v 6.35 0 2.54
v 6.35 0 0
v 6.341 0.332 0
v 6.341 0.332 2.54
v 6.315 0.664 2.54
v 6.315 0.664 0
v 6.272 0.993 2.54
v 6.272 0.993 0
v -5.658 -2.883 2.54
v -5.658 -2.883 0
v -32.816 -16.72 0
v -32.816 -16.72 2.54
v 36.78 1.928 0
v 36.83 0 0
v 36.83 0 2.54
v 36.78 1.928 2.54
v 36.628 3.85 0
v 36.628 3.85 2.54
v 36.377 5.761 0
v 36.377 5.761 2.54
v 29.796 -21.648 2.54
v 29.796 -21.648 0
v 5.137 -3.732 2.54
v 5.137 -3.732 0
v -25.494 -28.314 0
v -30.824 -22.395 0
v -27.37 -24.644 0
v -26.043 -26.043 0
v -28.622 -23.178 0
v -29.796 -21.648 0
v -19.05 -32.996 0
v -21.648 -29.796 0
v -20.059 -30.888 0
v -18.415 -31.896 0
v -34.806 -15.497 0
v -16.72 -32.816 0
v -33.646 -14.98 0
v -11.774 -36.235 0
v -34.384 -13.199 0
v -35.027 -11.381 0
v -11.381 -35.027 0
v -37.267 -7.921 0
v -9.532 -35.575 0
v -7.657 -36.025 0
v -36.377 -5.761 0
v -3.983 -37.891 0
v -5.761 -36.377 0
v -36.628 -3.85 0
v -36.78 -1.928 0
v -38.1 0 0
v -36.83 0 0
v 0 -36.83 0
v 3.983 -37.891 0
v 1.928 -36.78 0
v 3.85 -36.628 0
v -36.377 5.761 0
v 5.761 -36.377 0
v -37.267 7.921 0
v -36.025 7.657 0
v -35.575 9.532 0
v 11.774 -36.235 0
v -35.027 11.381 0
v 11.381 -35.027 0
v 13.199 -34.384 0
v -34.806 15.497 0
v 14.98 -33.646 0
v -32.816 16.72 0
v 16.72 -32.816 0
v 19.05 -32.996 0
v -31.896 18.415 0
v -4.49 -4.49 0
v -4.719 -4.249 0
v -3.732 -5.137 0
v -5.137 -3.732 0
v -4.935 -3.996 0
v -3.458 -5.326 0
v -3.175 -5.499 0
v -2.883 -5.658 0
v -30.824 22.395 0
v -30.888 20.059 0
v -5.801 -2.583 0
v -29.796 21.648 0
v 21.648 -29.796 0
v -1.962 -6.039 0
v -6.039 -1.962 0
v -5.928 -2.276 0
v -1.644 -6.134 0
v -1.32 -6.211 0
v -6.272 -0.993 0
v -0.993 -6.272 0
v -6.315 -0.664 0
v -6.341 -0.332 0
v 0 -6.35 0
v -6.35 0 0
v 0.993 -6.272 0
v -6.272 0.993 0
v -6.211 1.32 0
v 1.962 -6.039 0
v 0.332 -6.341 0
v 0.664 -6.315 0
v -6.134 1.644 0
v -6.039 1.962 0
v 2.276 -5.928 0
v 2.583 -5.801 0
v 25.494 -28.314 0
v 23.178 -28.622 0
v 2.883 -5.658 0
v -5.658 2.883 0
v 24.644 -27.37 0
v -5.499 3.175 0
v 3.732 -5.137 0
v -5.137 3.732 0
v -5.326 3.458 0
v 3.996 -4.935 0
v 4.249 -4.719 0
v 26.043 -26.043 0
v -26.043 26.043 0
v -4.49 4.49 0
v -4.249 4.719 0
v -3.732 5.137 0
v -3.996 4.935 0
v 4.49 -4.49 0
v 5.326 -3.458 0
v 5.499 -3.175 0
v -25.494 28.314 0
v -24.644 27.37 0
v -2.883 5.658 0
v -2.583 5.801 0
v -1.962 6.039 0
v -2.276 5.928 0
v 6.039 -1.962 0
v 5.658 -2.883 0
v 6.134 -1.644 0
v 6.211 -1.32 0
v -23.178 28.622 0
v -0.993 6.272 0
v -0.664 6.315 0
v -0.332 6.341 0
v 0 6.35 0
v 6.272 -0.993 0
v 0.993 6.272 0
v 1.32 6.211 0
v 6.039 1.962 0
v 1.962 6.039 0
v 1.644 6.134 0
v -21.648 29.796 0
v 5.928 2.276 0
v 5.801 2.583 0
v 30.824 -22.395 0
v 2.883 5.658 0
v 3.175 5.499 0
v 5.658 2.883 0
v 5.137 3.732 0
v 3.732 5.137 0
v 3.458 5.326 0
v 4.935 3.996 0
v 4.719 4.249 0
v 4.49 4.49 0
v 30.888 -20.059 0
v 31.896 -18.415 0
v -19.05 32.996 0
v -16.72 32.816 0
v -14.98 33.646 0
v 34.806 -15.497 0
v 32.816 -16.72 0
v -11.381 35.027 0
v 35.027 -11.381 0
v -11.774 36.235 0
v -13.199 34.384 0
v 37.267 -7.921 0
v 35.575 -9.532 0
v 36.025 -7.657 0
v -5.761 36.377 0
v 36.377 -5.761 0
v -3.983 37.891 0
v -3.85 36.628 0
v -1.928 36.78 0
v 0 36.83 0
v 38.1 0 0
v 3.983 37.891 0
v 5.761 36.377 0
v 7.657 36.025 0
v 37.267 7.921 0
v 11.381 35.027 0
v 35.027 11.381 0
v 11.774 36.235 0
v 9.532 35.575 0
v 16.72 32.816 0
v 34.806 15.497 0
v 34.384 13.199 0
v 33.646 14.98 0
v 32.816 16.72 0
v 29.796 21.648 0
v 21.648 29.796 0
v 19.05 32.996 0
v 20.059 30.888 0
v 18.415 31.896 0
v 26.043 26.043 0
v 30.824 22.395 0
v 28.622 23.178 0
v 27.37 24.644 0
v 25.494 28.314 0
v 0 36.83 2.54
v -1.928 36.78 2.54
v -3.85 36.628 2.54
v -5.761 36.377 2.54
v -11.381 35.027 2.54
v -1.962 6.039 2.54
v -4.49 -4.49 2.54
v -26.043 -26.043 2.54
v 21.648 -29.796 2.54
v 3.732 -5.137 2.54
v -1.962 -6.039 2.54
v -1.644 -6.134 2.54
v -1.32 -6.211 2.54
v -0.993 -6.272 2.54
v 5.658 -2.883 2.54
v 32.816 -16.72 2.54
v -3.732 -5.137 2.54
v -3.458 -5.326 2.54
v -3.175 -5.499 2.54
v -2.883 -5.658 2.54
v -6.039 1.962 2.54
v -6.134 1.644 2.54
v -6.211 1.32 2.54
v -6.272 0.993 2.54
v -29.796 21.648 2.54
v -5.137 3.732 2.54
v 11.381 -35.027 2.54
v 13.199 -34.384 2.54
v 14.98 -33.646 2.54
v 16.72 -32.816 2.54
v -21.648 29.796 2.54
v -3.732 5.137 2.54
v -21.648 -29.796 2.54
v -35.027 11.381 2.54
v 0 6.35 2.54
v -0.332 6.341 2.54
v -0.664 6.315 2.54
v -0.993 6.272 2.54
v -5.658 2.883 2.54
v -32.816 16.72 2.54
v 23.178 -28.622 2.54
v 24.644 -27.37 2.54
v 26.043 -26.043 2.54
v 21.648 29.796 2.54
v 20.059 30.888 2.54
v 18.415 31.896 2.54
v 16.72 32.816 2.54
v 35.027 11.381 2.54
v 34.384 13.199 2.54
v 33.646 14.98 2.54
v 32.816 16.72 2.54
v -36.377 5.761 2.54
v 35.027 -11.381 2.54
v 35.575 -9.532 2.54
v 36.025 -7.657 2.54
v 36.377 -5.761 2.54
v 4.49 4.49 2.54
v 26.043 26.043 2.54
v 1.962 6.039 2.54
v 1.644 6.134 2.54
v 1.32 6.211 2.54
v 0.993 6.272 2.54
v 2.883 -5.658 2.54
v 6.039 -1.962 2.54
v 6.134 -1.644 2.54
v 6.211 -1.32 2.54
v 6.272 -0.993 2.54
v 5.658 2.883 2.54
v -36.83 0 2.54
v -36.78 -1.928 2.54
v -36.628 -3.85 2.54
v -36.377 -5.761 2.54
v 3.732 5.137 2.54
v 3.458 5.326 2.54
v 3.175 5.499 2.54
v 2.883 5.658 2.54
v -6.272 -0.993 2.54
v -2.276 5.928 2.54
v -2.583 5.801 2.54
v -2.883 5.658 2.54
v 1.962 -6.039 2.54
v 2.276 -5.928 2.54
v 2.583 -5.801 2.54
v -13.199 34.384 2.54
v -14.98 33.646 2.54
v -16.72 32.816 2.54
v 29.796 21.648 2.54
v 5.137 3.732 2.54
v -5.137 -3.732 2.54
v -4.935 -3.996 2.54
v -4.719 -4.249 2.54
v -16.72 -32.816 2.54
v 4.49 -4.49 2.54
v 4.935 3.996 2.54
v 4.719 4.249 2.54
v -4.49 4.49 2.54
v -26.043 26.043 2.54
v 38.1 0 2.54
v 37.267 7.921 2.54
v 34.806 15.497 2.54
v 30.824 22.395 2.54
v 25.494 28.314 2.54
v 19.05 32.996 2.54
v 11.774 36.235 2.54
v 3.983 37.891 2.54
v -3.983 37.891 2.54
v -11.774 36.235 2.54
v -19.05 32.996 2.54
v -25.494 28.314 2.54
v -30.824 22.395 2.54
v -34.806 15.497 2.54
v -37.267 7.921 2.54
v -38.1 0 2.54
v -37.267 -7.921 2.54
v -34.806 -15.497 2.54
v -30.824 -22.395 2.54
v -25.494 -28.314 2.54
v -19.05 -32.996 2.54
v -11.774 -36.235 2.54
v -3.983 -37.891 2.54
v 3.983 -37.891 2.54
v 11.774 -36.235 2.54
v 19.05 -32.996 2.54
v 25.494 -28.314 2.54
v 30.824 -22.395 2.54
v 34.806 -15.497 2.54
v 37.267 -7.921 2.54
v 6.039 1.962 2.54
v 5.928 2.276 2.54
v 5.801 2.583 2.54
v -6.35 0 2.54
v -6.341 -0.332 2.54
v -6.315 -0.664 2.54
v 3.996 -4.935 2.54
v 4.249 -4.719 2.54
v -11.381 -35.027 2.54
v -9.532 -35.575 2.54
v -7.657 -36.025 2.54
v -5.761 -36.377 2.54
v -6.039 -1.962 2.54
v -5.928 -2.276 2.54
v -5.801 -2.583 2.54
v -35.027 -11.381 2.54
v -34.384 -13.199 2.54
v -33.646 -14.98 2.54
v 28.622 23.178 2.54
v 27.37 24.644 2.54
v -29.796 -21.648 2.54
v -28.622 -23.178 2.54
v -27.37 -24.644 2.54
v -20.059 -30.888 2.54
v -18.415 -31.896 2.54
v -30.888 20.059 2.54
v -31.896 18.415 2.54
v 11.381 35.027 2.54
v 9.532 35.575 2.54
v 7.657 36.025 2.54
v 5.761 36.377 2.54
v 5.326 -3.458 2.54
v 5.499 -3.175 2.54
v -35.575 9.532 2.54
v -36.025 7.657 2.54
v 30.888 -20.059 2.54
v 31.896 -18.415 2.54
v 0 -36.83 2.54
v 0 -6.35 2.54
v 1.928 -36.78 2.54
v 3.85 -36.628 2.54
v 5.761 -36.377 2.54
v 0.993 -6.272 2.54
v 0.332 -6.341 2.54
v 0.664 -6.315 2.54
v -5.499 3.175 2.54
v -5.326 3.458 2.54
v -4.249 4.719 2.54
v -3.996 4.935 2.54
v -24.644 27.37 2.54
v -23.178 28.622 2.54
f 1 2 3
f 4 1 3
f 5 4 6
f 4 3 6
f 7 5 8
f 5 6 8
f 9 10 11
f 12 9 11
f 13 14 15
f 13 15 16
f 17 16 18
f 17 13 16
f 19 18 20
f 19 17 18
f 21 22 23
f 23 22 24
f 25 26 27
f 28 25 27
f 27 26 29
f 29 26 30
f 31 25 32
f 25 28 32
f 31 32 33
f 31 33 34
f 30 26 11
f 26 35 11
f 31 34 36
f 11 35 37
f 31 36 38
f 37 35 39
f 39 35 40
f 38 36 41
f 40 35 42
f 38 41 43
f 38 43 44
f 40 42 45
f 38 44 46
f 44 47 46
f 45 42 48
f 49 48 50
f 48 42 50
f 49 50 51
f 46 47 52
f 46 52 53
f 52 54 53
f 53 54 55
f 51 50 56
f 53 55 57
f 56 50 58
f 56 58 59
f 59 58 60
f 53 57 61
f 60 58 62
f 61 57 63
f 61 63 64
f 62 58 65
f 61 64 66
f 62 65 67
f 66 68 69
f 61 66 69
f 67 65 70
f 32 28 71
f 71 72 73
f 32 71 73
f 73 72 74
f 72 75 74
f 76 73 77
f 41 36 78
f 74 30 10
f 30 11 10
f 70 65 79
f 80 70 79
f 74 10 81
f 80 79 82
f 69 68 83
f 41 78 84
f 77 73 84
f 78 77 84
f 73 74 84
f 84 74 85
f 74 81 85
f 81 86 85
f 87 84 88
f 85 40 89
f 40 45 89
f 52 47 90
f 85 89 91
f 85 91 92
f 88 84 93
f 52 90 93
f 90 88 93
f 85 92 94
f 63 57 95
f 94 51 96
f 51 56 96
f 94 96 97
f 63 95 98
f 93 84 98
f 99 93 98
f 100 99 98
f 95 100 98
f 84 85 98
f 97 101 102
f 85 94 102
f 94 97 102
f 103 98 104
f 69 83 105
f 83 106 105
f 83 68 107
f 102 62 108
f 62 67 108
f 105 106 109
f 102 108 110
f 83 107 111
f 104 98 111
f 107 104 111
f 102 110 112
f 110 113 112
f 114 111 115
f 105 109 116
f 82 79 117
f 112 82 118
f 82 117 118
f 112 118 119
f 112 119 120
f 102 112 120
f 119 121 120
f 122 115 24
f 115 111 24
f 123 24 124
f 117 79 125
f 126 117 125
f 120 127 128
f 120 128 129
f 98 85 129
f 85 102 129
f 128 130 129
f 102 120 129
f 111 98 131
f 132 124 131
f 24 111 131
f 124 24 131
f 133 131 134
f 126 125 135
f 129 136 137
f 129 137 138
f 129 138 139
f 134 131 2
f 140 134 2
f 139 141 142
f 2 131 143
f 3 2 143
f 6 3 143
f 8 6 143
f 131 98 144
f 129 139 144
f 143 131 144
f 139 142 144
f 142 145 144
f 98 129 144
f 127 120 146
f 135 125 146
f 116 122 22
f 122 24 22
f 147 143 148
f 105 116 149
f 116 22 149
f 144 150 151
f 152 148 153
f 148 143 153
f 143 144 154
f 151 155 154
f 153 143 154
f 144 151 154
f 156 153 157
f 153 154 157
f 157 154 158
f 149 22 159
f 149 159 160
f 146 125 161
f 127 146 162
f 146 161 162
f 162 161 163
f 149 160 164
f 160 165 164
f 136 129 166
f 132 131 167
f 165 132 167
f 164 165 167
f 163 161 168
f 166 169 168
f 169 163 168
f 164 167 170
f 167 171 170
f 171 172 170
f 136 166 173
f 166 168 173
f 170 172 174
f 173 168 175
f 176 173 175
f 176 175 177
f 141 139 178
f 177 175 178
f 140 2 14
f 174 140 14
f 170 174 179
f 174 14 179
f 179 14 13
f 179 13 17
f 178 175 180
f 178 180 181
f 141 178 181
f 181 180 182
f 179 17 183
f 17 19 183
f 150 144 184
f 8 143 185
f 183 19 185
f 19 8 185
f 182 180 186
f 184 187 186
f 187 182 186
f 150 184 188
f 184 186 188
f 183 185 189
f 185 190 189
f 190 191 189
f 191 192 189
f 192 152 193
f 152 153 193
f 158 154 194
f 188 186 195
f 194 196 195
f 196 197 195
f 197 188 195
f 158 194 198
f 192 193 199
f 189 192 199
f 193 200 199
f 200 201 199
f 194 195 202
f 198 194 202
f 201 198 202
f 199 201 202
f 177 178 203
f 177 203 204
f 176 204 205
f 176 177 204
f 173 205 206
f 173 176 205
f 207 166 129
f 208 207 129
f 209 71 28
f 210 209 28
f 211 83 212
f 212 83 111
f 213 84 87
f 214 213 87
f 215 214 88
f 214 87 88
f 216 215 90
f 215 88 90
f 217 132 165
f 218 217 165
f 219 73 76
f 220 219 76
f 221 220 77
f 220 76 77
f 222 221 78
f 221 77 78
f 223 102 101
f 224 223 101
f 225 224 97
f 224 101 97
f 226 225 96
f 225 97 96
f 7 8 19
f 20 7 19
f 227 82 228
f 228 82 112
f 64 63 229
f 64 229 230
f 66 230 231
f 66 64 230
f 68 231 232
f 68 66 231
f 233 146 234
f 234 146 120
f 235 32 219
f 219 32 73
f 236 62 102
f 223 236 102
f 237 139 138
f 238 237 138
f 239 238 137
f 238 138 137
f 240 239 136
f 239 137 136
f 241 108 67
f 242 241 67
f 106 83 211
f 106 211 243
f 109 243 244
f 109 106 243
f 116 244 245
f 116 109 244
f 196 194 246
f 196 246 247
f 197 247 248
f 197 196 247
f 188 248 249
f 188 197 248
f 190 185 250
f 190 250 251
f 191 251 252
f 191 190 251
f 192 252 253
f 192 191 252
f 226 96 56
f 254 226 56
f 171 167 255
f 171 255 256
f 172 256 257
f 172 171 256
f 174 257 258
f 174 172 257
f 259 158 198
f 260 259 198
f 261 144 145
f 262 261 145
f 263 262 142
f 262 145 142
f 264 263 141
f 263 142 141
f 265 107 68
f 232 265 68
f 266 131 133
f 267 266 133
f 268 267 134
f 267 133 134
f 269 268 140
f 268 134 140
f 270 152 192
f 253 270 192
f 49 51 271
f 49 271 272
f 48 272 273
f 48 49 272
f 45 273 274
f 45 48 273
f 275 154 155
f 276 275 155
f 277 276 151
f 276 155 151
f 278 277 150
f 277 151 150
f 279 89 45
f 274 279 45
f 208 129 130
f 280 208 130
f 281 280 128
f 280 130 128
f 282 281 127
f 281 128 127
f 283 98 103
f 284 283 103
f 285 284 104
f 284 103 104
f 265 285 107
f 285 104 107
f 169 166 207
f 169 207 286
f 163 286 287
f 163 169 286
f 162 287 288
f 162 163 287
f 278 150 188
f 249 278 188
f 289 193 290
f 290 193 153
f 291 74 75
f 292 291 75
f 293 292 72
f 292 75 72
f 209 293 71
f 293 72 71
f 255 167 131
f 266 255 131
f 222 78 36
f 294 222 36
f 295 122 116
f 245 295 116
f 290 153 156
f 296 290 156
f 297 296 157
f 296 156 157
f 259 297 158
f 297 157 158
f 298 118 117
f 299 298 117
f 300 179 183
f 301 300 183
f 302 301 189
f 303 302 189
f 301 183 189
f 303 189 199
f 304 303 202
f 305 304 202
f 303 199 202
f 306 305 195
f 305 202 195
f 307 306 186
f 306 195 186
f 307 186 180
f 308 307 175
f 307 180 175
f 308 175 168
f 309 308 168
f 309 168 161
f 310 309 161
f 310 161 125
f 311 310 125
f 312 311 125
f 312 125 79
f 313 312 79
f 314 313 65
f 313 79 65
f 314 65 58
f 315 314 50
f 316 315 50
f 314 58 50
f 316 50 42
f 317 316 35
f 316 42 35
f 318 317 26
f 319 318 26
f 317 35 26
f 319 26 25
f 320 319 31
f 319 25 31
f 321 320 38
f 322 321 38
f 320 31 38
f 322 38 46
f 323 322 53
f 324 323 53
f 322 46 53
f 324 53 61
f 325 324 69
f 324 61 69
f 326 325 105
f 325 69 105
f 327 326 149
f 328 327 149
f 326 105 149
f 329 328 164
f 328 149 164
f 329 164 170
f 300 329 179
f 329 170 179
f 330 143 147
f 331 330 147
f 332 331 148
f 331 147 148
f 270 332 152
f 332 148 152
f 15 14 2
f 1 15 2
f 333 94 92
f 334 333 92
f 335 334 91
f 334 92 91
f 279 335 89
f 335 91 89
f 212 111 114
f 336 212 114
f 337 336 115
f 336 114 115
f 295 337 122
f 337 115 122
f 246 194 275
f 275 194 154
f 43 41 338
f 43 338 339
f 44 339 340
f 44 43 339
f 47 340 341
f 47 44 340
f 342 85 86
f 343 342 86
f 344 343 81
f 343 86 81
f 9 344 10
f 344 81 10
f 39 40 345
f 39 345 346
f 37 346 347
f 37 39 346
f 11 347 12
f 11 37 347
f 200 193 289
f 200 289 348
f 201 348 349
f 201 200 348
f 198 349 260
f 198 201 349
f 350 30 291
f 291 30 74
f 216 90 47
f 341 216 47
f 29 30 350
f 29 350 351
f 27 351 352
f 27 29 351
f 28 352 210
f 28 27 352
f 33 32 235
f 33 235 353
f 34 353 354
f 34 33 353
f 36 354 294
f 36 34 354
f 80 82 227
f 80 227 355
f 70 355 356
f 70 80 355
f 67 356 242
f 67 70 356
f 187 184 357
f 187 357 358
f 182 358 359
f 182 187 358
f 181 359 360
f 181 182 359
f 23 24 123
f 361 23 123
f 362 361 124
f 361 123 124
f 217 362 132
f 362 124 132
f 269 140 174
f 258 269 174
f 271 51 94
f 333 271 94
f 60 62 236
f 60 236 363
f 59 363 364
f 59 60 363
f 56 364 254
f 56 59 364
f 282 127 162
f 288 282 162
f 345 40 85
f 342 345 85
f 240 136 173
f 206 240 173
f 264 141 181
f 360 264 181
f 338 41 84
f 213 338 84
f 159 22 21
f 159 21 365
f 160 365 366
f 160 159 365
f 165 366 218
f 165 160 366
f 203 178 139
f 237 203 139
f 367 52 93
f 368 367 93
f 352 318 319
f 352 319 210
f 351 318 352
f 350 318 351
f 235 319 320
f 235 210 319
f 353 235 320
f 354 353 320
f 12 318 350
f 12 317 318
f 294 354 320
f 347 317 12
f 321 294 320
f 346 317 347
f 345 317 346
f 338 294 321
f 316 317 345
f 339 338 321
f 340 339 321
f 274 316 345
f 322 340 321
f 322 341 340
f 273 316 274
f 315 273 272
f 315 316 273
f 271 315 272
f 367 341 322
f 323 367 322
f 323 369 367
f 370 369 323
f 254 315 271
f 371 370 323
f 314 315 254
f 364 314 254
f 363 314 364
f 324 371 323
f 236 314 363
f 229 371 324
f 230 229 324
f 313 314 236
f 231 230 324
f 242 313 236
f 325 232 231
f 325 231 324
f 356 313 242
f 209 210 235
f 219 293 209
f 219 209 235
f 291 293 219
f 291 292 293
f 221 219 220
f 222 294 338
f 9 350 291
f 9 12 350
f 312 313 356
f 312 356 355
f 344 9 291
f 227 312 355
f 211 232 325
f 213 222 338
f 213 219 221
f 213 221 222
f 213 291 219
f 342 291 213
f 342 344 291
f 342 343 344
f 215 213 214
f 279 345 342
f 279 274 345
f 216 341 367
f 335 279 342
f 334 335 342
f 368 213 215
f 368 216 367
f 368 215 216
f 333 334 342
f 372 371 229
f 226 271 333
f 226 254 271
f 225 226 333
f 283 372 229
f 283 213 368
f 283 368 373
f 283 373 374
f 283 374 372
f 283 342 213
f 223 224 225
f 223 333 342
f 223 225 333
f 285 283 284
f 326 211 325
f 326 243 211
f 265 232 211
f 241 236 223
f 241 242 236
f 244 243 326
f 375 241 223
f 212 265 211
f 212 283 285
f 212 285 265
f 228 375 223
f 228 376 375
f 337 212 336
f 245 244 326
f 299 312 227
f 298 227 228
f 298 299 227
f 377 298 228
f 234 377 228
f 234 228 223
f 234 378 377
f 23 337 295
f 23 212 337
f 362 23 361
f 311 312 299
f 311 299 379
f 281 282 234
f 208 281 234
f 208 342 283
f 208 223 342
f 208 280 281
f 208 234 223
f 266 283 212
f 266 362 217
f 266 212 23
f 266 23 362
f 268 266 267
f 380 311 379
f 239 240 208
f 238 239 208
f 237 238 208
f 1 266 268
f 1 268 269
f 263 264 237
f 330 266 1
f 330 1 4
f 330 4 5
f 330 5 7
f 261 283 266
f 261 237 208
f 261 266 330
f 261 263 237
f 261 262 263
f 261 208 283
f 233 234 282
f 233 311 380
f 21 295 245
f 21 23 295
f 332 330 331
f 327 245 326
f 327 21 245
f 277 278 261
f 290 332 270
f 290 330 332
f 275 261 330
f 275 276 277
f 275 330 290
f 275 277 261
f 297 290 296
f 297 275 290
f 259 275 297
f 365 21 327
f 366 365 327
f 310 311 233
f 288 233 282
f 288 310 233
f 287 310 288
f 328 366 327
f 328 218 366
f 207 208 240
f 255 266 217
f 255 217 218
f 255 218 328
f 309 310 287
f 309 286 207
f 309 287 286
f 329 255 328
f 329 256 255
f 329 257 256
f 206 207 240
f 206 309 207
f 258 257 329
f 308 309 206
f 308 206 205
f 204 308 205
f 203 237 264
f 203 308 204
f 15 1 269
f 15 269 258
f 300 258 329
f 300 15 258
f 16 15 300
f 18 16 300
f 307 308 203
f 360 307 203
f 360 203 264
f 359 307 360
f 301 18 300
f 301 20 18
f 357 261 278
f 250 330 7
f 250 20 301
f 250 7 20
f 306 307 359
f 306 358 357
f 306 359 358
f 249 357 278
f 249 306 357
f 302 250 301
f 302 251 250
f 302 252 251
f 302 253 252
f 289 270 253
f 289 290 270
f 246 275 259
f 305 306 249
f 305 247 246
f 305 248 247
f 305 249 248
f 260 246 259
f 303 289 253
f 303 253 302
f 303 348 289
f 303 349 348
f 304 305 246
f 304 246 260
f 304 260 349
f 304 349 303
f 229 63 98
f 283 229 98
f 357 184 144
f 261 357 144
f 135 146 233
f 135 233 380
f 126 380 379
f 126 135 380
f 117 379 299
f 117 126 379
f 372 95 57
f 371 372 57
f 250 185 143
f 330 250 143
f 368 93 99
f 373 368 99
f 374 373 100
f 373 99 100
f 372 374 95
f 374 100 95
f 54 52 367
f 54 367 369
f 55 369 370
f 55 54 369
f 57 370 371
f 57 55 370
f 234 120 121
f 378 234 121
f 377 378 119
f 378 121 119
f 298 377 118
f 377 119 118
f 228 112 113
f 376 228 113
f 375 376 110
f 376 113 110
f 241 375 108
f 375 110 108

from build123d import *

# Parameters (mm, degrees)
SKETCH1_R           = 38.1
BOSS_EXTRUDE3_DEPTH = 2.54


with BuildPart() as part:
    # Sketch1 → Boss-Extrude3 (new body)
    with BuildSketch(Plane.XY):
        Circle(SKETCH1_R)
        with BuildLine():
            Line((0, -36.83), (0, -6.35))
            ThreePointArc((0, -6.35), (0.498215258, -6.330425069), (0.993358853, -6.271820963))
            Line((0.993358853, -6.271820963), (5.761481347, -36.376561584))
            ThreePointArc((5.761481347, -36.376561584), (2.889648496, -36.716465401), (0, -36.83))
        make_face(mode=Mode.SUBTRACT)
        with BuildLine():
            Line((-0.993358853, -6.271820963), (-5.761481347, -36.376561584))
            ThreePointArc((-5.761481347, -36.376561584), (-8.597792751, -35.812384168), (-11.381095903, -35.027411495))
            Line((-11.381095903, -35.027411495), (-1.962257914, -6.039208878))
            ThreePointArc((-1.962257914, -6.039208878), (-1.48237806, -6.174548995), (-0.993358853, -6.271820963))
        make_face(mode=Mode.SUBTRACT)
        with BuildLine():
            ThreePointArc((16.720470105, -32.815770286), (14.094230814, -34.026483182), (11.381095903, -35.027411495))
            Line((11.381095903, -35.027411495), (1.962257914, -6.039208878))
            ThreePointArc((1.962257914, -6.039208878), (2.430039796, -5.866635031), (2.882839673, -5.657891429))
            Line((2.882839673, -5.657891429), (16.720470105, -32.815770286))
        make_face(mode=Mode.SUBTRACT)
        with BuildLine():
            ThreePointArc((26.042742751, -26.042742751), (23.91917162, -28.005751713), (21.648130842, -29.796095903))
            Line((21.648130842, -29.796095903), (3.732436352, -5.137257914))
            ThreePointArc((3.732436352, -5.137257914), (4.123995107, -4.828577882), (4.490128061, -4.490128061))
            Line((4.490128061, -4.490128061), (26.042742751, -26.042742751))
        make_face(mode=Mode.SUBTRACT)
        with BuildLine():
            ThreePointArc((32.815770286, -16.720470105), (31.402737253, -19.243622138), (29.796095903, -21.648130842))
            Line((29.796095903, -21.648130842), (5.137257914, -3.732436352))
            ThreePointArc((5.137257914, -3.732436352), (5.414265044, -3.317865886), (5.657891429, -2.882839673))
            Line((5.657891429, -2.882839673), (32.815770286, -16.720470105))
        make_face(mode=Mode.SUBTRACT)
        with BuildLine():
            ThreePointArc((36.376561584, -5.761481347), (35.812384168, -8.597792751), (35.027411495, -11.381095903))
            Line((35.027411495, -11.381095903), (6.039208878, -1.962257914))
            ThreePointArc((6.039208878, -1.962257914), (6.174548995, -1.48237806), (6.271820963, -0.993358853))
            Line((6.271820963, -0.993358853), (36.376561584, -5.761481347))
        make_face(mode=Mode.SUBTRACT)
        with BuildLine():
            ThreePointArc((36.376561584, 5.761481347), (36.716465401, 2.889648496), (36.83, 0))
            Line((36.83, 0), (6.35, 0))
            ThreePointArc((6.35, 0), (6.330425069, 0.498215258), (6.271820963, 0.993358853))
            Line((6.271820963, 0.993358853), (36.376561584, 5.761481347))
        make_face(mode=Mode.SUBTRACT)
        with BuildLine():
            ThreePointArc((32.815770286, 16.720470105), (34.026483182, 14.094230814), (35.027411495, 11.381095903))
            Line((35.027411495, 11.381095903), (6.039208878, 1.962257914))
            ThreePointArc((6.039208878, 1.962257914), (5.866635031, 2.430039796), (5.657891429, 2.882839673))
            Line((5.657891429, 2.882839673), (32.815770286, 16.720470105))
        make_face(mode=Mode.SUBTRACT)
        with BuildLine():
            ThreePointArc((26.042742751, 26.042742751), (28.005751713, 23.91917162), (29.796095903, 21.648130842))
            Line((29.796095903, 21.648130842), (5.137257914, 3.732436352))
            ThreePointArc((5.137257914, 3.732436352), (4.828577882, 4.123995107), (4.490128061, 4.490128061))
            Line((4.490128061, 4.490128061), (26.042742751, 26.042742751))
        make_face(mode=Mode.SUBTRACT)
        with BuildLine():
            ThreePointArc((16.720470105, 32.815770286), (19.243622138, 31.402737253), (21.648130842, 29.796095903))
            Line((21.648130842, 29.796095903), (3.732436352, 5.137257914))
            ThreePointArc((3.732436352, 5.137257914), (3.317865886, 5.414265044), (2.882839673, 5.657891429))
            Line((2.882839673, 5.657891429), (16.720470105, 32.815770286))
        make_face(mode=Mode.SUBTRACT)
        with BuildLine():
            ThreePointArc((5.761481347, 36.376561584), (8.597792751, 35.812384168), (11.381095903, 35.027411495))
            Line((11.381095903, 35.027411495), (1.962257914, 6.039208878))
            ThreePointArc((1.962257914, 6.039208878), (1.48237806, 6.174548995), (0.993358853, 6.271820963))
            Line((0.993358853, 6.271820963), (5.761481347, 36.376561584))
        make_face(mode=Mode.SUBTRACT)
        with BuildLine():
            ThreePointArc((-5.761481347, 36.376561584), (-2.889648496, 36.716465401), (0, 36.83))
            Line((0, 36.83), (0, 6.35))
            ThreePointArc((0, 6.35), (-0.498215258, 6.330425069), (-0.993358853, 6.271820963))
            Line((-0.993358853, 6.271820963), (-5.761481347, 36.376561584))
        make_face(mode=Mode.SUBTRACT)
        with BuildLine():
            ThreePointArc((-16.720470105, 32.815770286), (-14.094230814, 34.026483182), (-11.381095903, 35.027411495))
            Line((-11.381095903, 35.027411495), (-1.962257914, 6.039208878))
            ThreePointArc((-1.962257914, 6.039208878), (-2.430039796, 5.866635031), (-2.882839673, 5.657891429))
            Line((-2.882839673, 5.657891429), (-16.720470105, 32.815770286))
        make_face(mode=Mode.SUBTRACT)
        with BuildLine():
            ThreePointArc((-26.042742751, 26.042742751), (-23.91917162, 28.005751713), (-21.648130842, 29.796095903))
            Line((-21.648130842, 29.796095903), (-3.732436352, 5.137257914))
            ThreePointArc((-3.732436352, 5.137257914), (-4.123995107, 4.828577882), (-4.490128061, 4.490128061))
            Line((-4.490128061, 4.490128061), (-26.042742751, 26.042742751))
        make_face(mode=Mode.SUBTRACT)
        with BuildLine():
            ThreePointArc((-32.815770286, 16.720470105), (-31.402737253, 19.243622138), (-29.796095903, 21.648130842))
            Line((-29.796095903, 21.648130842), (-5.137257914, 3.732436352))
            ThreePointArc((-5.137257914, 3.732436352), (-5.414265044, 3.317865886), (-5.657891429, 2.882839673))
            Line((-5.657891429, 2.882839673), (-32.815770286, 16.720470105))
        make_face(mode=Mode.SUBTRACT)
        with BuildLine():
            ThreePointArc((-36.376561584, 5.761481347), (-35.812384168, 8.597792751), (-35.027411495, 11.381095903))
            Line((-35.027411495, 11.381095903), (-6.039208878, 1.962257914))
            ThreePointArc((-6.039208878, 1.962257914), (-6.174548995, 1.48237806), (-6.271820963, 0.993358853))
            Line((-6.271820963, 0.993358853), (-36.376561584, 5.761481347))
        make_face(mode=Mode.SUBTRACT)
        with BuildLine():
            ThreePointArc((-36.376561584, -5.761481347), (-36.716465401, -2.889648496), (-36.83, 0))
            Line((-36.83, 0), (-6.35, 0))
            ThreePointArc((-6.35, 0), (-6.330425069, -0.498215258), (-6.271820963, -0.993358853))
            Line((-6.271820963, -0.993358853), (-36.376561584, -5.761481347))
        make_face(mode=Mode.SUBTRACT)
        with BuildLine():
            ThreePointArc((-32.815770286, -16.720470105), (-34.026483182, -14.094230814), (-35.027411495, -11.381095903))
            Line((-35.027411495, -11.381095903), (-6.039208878, -1.962257914))
            ThreePointArc((-6.039208878, -1.962257914), (-5.866635031, -2.430039796), (-5.657891429, -2.882839673))
            Line((-5.657891429, -2.882839673), (-32.815770286, -16.720470105))
        make_face(mode=Mode.SUBTRACT)
        with BuildLine():
            ThreePointArc((-26.042742751, -26.042742751), (-28.005751713, -23.91917162), (-29.796095903, -21.648130842))
            Line((-29.796095903, -21.648130842), (-5.137257914, -3.732436352))
            ThreePointArc((-5.137257914, -3.732436352), (-4.828577882, -4.123995107), (-4.490128061, -4.490128061))
            Line((-4.490128061, -4.490128061), (-26.042742751, -26.042742751))
        make_face(mode=Mode.SUBTRACT)
        with BuildLine():
            ThreePointArc((-16.720470105, -32.815770286), (-19.243622138, -31.402737253), (-21.648130842, -29.796095903))
            Line((-21.648130842, -29.796095903), (-3.732436352, -5.137257914))
            ThreePointArc((-3.732436352, -5.137257914), (-3.317865886, -5.414265044), (-2.882839673, -5.657891429))
            Line((-2.882839673, -5.657891429), (-16.720470105, -32.815770286))
        make_face(mode=Mode.SUBTRACT)
    extrude(amount=BOSS_EXTRUDE3_DEPTH)


solid = part.part
